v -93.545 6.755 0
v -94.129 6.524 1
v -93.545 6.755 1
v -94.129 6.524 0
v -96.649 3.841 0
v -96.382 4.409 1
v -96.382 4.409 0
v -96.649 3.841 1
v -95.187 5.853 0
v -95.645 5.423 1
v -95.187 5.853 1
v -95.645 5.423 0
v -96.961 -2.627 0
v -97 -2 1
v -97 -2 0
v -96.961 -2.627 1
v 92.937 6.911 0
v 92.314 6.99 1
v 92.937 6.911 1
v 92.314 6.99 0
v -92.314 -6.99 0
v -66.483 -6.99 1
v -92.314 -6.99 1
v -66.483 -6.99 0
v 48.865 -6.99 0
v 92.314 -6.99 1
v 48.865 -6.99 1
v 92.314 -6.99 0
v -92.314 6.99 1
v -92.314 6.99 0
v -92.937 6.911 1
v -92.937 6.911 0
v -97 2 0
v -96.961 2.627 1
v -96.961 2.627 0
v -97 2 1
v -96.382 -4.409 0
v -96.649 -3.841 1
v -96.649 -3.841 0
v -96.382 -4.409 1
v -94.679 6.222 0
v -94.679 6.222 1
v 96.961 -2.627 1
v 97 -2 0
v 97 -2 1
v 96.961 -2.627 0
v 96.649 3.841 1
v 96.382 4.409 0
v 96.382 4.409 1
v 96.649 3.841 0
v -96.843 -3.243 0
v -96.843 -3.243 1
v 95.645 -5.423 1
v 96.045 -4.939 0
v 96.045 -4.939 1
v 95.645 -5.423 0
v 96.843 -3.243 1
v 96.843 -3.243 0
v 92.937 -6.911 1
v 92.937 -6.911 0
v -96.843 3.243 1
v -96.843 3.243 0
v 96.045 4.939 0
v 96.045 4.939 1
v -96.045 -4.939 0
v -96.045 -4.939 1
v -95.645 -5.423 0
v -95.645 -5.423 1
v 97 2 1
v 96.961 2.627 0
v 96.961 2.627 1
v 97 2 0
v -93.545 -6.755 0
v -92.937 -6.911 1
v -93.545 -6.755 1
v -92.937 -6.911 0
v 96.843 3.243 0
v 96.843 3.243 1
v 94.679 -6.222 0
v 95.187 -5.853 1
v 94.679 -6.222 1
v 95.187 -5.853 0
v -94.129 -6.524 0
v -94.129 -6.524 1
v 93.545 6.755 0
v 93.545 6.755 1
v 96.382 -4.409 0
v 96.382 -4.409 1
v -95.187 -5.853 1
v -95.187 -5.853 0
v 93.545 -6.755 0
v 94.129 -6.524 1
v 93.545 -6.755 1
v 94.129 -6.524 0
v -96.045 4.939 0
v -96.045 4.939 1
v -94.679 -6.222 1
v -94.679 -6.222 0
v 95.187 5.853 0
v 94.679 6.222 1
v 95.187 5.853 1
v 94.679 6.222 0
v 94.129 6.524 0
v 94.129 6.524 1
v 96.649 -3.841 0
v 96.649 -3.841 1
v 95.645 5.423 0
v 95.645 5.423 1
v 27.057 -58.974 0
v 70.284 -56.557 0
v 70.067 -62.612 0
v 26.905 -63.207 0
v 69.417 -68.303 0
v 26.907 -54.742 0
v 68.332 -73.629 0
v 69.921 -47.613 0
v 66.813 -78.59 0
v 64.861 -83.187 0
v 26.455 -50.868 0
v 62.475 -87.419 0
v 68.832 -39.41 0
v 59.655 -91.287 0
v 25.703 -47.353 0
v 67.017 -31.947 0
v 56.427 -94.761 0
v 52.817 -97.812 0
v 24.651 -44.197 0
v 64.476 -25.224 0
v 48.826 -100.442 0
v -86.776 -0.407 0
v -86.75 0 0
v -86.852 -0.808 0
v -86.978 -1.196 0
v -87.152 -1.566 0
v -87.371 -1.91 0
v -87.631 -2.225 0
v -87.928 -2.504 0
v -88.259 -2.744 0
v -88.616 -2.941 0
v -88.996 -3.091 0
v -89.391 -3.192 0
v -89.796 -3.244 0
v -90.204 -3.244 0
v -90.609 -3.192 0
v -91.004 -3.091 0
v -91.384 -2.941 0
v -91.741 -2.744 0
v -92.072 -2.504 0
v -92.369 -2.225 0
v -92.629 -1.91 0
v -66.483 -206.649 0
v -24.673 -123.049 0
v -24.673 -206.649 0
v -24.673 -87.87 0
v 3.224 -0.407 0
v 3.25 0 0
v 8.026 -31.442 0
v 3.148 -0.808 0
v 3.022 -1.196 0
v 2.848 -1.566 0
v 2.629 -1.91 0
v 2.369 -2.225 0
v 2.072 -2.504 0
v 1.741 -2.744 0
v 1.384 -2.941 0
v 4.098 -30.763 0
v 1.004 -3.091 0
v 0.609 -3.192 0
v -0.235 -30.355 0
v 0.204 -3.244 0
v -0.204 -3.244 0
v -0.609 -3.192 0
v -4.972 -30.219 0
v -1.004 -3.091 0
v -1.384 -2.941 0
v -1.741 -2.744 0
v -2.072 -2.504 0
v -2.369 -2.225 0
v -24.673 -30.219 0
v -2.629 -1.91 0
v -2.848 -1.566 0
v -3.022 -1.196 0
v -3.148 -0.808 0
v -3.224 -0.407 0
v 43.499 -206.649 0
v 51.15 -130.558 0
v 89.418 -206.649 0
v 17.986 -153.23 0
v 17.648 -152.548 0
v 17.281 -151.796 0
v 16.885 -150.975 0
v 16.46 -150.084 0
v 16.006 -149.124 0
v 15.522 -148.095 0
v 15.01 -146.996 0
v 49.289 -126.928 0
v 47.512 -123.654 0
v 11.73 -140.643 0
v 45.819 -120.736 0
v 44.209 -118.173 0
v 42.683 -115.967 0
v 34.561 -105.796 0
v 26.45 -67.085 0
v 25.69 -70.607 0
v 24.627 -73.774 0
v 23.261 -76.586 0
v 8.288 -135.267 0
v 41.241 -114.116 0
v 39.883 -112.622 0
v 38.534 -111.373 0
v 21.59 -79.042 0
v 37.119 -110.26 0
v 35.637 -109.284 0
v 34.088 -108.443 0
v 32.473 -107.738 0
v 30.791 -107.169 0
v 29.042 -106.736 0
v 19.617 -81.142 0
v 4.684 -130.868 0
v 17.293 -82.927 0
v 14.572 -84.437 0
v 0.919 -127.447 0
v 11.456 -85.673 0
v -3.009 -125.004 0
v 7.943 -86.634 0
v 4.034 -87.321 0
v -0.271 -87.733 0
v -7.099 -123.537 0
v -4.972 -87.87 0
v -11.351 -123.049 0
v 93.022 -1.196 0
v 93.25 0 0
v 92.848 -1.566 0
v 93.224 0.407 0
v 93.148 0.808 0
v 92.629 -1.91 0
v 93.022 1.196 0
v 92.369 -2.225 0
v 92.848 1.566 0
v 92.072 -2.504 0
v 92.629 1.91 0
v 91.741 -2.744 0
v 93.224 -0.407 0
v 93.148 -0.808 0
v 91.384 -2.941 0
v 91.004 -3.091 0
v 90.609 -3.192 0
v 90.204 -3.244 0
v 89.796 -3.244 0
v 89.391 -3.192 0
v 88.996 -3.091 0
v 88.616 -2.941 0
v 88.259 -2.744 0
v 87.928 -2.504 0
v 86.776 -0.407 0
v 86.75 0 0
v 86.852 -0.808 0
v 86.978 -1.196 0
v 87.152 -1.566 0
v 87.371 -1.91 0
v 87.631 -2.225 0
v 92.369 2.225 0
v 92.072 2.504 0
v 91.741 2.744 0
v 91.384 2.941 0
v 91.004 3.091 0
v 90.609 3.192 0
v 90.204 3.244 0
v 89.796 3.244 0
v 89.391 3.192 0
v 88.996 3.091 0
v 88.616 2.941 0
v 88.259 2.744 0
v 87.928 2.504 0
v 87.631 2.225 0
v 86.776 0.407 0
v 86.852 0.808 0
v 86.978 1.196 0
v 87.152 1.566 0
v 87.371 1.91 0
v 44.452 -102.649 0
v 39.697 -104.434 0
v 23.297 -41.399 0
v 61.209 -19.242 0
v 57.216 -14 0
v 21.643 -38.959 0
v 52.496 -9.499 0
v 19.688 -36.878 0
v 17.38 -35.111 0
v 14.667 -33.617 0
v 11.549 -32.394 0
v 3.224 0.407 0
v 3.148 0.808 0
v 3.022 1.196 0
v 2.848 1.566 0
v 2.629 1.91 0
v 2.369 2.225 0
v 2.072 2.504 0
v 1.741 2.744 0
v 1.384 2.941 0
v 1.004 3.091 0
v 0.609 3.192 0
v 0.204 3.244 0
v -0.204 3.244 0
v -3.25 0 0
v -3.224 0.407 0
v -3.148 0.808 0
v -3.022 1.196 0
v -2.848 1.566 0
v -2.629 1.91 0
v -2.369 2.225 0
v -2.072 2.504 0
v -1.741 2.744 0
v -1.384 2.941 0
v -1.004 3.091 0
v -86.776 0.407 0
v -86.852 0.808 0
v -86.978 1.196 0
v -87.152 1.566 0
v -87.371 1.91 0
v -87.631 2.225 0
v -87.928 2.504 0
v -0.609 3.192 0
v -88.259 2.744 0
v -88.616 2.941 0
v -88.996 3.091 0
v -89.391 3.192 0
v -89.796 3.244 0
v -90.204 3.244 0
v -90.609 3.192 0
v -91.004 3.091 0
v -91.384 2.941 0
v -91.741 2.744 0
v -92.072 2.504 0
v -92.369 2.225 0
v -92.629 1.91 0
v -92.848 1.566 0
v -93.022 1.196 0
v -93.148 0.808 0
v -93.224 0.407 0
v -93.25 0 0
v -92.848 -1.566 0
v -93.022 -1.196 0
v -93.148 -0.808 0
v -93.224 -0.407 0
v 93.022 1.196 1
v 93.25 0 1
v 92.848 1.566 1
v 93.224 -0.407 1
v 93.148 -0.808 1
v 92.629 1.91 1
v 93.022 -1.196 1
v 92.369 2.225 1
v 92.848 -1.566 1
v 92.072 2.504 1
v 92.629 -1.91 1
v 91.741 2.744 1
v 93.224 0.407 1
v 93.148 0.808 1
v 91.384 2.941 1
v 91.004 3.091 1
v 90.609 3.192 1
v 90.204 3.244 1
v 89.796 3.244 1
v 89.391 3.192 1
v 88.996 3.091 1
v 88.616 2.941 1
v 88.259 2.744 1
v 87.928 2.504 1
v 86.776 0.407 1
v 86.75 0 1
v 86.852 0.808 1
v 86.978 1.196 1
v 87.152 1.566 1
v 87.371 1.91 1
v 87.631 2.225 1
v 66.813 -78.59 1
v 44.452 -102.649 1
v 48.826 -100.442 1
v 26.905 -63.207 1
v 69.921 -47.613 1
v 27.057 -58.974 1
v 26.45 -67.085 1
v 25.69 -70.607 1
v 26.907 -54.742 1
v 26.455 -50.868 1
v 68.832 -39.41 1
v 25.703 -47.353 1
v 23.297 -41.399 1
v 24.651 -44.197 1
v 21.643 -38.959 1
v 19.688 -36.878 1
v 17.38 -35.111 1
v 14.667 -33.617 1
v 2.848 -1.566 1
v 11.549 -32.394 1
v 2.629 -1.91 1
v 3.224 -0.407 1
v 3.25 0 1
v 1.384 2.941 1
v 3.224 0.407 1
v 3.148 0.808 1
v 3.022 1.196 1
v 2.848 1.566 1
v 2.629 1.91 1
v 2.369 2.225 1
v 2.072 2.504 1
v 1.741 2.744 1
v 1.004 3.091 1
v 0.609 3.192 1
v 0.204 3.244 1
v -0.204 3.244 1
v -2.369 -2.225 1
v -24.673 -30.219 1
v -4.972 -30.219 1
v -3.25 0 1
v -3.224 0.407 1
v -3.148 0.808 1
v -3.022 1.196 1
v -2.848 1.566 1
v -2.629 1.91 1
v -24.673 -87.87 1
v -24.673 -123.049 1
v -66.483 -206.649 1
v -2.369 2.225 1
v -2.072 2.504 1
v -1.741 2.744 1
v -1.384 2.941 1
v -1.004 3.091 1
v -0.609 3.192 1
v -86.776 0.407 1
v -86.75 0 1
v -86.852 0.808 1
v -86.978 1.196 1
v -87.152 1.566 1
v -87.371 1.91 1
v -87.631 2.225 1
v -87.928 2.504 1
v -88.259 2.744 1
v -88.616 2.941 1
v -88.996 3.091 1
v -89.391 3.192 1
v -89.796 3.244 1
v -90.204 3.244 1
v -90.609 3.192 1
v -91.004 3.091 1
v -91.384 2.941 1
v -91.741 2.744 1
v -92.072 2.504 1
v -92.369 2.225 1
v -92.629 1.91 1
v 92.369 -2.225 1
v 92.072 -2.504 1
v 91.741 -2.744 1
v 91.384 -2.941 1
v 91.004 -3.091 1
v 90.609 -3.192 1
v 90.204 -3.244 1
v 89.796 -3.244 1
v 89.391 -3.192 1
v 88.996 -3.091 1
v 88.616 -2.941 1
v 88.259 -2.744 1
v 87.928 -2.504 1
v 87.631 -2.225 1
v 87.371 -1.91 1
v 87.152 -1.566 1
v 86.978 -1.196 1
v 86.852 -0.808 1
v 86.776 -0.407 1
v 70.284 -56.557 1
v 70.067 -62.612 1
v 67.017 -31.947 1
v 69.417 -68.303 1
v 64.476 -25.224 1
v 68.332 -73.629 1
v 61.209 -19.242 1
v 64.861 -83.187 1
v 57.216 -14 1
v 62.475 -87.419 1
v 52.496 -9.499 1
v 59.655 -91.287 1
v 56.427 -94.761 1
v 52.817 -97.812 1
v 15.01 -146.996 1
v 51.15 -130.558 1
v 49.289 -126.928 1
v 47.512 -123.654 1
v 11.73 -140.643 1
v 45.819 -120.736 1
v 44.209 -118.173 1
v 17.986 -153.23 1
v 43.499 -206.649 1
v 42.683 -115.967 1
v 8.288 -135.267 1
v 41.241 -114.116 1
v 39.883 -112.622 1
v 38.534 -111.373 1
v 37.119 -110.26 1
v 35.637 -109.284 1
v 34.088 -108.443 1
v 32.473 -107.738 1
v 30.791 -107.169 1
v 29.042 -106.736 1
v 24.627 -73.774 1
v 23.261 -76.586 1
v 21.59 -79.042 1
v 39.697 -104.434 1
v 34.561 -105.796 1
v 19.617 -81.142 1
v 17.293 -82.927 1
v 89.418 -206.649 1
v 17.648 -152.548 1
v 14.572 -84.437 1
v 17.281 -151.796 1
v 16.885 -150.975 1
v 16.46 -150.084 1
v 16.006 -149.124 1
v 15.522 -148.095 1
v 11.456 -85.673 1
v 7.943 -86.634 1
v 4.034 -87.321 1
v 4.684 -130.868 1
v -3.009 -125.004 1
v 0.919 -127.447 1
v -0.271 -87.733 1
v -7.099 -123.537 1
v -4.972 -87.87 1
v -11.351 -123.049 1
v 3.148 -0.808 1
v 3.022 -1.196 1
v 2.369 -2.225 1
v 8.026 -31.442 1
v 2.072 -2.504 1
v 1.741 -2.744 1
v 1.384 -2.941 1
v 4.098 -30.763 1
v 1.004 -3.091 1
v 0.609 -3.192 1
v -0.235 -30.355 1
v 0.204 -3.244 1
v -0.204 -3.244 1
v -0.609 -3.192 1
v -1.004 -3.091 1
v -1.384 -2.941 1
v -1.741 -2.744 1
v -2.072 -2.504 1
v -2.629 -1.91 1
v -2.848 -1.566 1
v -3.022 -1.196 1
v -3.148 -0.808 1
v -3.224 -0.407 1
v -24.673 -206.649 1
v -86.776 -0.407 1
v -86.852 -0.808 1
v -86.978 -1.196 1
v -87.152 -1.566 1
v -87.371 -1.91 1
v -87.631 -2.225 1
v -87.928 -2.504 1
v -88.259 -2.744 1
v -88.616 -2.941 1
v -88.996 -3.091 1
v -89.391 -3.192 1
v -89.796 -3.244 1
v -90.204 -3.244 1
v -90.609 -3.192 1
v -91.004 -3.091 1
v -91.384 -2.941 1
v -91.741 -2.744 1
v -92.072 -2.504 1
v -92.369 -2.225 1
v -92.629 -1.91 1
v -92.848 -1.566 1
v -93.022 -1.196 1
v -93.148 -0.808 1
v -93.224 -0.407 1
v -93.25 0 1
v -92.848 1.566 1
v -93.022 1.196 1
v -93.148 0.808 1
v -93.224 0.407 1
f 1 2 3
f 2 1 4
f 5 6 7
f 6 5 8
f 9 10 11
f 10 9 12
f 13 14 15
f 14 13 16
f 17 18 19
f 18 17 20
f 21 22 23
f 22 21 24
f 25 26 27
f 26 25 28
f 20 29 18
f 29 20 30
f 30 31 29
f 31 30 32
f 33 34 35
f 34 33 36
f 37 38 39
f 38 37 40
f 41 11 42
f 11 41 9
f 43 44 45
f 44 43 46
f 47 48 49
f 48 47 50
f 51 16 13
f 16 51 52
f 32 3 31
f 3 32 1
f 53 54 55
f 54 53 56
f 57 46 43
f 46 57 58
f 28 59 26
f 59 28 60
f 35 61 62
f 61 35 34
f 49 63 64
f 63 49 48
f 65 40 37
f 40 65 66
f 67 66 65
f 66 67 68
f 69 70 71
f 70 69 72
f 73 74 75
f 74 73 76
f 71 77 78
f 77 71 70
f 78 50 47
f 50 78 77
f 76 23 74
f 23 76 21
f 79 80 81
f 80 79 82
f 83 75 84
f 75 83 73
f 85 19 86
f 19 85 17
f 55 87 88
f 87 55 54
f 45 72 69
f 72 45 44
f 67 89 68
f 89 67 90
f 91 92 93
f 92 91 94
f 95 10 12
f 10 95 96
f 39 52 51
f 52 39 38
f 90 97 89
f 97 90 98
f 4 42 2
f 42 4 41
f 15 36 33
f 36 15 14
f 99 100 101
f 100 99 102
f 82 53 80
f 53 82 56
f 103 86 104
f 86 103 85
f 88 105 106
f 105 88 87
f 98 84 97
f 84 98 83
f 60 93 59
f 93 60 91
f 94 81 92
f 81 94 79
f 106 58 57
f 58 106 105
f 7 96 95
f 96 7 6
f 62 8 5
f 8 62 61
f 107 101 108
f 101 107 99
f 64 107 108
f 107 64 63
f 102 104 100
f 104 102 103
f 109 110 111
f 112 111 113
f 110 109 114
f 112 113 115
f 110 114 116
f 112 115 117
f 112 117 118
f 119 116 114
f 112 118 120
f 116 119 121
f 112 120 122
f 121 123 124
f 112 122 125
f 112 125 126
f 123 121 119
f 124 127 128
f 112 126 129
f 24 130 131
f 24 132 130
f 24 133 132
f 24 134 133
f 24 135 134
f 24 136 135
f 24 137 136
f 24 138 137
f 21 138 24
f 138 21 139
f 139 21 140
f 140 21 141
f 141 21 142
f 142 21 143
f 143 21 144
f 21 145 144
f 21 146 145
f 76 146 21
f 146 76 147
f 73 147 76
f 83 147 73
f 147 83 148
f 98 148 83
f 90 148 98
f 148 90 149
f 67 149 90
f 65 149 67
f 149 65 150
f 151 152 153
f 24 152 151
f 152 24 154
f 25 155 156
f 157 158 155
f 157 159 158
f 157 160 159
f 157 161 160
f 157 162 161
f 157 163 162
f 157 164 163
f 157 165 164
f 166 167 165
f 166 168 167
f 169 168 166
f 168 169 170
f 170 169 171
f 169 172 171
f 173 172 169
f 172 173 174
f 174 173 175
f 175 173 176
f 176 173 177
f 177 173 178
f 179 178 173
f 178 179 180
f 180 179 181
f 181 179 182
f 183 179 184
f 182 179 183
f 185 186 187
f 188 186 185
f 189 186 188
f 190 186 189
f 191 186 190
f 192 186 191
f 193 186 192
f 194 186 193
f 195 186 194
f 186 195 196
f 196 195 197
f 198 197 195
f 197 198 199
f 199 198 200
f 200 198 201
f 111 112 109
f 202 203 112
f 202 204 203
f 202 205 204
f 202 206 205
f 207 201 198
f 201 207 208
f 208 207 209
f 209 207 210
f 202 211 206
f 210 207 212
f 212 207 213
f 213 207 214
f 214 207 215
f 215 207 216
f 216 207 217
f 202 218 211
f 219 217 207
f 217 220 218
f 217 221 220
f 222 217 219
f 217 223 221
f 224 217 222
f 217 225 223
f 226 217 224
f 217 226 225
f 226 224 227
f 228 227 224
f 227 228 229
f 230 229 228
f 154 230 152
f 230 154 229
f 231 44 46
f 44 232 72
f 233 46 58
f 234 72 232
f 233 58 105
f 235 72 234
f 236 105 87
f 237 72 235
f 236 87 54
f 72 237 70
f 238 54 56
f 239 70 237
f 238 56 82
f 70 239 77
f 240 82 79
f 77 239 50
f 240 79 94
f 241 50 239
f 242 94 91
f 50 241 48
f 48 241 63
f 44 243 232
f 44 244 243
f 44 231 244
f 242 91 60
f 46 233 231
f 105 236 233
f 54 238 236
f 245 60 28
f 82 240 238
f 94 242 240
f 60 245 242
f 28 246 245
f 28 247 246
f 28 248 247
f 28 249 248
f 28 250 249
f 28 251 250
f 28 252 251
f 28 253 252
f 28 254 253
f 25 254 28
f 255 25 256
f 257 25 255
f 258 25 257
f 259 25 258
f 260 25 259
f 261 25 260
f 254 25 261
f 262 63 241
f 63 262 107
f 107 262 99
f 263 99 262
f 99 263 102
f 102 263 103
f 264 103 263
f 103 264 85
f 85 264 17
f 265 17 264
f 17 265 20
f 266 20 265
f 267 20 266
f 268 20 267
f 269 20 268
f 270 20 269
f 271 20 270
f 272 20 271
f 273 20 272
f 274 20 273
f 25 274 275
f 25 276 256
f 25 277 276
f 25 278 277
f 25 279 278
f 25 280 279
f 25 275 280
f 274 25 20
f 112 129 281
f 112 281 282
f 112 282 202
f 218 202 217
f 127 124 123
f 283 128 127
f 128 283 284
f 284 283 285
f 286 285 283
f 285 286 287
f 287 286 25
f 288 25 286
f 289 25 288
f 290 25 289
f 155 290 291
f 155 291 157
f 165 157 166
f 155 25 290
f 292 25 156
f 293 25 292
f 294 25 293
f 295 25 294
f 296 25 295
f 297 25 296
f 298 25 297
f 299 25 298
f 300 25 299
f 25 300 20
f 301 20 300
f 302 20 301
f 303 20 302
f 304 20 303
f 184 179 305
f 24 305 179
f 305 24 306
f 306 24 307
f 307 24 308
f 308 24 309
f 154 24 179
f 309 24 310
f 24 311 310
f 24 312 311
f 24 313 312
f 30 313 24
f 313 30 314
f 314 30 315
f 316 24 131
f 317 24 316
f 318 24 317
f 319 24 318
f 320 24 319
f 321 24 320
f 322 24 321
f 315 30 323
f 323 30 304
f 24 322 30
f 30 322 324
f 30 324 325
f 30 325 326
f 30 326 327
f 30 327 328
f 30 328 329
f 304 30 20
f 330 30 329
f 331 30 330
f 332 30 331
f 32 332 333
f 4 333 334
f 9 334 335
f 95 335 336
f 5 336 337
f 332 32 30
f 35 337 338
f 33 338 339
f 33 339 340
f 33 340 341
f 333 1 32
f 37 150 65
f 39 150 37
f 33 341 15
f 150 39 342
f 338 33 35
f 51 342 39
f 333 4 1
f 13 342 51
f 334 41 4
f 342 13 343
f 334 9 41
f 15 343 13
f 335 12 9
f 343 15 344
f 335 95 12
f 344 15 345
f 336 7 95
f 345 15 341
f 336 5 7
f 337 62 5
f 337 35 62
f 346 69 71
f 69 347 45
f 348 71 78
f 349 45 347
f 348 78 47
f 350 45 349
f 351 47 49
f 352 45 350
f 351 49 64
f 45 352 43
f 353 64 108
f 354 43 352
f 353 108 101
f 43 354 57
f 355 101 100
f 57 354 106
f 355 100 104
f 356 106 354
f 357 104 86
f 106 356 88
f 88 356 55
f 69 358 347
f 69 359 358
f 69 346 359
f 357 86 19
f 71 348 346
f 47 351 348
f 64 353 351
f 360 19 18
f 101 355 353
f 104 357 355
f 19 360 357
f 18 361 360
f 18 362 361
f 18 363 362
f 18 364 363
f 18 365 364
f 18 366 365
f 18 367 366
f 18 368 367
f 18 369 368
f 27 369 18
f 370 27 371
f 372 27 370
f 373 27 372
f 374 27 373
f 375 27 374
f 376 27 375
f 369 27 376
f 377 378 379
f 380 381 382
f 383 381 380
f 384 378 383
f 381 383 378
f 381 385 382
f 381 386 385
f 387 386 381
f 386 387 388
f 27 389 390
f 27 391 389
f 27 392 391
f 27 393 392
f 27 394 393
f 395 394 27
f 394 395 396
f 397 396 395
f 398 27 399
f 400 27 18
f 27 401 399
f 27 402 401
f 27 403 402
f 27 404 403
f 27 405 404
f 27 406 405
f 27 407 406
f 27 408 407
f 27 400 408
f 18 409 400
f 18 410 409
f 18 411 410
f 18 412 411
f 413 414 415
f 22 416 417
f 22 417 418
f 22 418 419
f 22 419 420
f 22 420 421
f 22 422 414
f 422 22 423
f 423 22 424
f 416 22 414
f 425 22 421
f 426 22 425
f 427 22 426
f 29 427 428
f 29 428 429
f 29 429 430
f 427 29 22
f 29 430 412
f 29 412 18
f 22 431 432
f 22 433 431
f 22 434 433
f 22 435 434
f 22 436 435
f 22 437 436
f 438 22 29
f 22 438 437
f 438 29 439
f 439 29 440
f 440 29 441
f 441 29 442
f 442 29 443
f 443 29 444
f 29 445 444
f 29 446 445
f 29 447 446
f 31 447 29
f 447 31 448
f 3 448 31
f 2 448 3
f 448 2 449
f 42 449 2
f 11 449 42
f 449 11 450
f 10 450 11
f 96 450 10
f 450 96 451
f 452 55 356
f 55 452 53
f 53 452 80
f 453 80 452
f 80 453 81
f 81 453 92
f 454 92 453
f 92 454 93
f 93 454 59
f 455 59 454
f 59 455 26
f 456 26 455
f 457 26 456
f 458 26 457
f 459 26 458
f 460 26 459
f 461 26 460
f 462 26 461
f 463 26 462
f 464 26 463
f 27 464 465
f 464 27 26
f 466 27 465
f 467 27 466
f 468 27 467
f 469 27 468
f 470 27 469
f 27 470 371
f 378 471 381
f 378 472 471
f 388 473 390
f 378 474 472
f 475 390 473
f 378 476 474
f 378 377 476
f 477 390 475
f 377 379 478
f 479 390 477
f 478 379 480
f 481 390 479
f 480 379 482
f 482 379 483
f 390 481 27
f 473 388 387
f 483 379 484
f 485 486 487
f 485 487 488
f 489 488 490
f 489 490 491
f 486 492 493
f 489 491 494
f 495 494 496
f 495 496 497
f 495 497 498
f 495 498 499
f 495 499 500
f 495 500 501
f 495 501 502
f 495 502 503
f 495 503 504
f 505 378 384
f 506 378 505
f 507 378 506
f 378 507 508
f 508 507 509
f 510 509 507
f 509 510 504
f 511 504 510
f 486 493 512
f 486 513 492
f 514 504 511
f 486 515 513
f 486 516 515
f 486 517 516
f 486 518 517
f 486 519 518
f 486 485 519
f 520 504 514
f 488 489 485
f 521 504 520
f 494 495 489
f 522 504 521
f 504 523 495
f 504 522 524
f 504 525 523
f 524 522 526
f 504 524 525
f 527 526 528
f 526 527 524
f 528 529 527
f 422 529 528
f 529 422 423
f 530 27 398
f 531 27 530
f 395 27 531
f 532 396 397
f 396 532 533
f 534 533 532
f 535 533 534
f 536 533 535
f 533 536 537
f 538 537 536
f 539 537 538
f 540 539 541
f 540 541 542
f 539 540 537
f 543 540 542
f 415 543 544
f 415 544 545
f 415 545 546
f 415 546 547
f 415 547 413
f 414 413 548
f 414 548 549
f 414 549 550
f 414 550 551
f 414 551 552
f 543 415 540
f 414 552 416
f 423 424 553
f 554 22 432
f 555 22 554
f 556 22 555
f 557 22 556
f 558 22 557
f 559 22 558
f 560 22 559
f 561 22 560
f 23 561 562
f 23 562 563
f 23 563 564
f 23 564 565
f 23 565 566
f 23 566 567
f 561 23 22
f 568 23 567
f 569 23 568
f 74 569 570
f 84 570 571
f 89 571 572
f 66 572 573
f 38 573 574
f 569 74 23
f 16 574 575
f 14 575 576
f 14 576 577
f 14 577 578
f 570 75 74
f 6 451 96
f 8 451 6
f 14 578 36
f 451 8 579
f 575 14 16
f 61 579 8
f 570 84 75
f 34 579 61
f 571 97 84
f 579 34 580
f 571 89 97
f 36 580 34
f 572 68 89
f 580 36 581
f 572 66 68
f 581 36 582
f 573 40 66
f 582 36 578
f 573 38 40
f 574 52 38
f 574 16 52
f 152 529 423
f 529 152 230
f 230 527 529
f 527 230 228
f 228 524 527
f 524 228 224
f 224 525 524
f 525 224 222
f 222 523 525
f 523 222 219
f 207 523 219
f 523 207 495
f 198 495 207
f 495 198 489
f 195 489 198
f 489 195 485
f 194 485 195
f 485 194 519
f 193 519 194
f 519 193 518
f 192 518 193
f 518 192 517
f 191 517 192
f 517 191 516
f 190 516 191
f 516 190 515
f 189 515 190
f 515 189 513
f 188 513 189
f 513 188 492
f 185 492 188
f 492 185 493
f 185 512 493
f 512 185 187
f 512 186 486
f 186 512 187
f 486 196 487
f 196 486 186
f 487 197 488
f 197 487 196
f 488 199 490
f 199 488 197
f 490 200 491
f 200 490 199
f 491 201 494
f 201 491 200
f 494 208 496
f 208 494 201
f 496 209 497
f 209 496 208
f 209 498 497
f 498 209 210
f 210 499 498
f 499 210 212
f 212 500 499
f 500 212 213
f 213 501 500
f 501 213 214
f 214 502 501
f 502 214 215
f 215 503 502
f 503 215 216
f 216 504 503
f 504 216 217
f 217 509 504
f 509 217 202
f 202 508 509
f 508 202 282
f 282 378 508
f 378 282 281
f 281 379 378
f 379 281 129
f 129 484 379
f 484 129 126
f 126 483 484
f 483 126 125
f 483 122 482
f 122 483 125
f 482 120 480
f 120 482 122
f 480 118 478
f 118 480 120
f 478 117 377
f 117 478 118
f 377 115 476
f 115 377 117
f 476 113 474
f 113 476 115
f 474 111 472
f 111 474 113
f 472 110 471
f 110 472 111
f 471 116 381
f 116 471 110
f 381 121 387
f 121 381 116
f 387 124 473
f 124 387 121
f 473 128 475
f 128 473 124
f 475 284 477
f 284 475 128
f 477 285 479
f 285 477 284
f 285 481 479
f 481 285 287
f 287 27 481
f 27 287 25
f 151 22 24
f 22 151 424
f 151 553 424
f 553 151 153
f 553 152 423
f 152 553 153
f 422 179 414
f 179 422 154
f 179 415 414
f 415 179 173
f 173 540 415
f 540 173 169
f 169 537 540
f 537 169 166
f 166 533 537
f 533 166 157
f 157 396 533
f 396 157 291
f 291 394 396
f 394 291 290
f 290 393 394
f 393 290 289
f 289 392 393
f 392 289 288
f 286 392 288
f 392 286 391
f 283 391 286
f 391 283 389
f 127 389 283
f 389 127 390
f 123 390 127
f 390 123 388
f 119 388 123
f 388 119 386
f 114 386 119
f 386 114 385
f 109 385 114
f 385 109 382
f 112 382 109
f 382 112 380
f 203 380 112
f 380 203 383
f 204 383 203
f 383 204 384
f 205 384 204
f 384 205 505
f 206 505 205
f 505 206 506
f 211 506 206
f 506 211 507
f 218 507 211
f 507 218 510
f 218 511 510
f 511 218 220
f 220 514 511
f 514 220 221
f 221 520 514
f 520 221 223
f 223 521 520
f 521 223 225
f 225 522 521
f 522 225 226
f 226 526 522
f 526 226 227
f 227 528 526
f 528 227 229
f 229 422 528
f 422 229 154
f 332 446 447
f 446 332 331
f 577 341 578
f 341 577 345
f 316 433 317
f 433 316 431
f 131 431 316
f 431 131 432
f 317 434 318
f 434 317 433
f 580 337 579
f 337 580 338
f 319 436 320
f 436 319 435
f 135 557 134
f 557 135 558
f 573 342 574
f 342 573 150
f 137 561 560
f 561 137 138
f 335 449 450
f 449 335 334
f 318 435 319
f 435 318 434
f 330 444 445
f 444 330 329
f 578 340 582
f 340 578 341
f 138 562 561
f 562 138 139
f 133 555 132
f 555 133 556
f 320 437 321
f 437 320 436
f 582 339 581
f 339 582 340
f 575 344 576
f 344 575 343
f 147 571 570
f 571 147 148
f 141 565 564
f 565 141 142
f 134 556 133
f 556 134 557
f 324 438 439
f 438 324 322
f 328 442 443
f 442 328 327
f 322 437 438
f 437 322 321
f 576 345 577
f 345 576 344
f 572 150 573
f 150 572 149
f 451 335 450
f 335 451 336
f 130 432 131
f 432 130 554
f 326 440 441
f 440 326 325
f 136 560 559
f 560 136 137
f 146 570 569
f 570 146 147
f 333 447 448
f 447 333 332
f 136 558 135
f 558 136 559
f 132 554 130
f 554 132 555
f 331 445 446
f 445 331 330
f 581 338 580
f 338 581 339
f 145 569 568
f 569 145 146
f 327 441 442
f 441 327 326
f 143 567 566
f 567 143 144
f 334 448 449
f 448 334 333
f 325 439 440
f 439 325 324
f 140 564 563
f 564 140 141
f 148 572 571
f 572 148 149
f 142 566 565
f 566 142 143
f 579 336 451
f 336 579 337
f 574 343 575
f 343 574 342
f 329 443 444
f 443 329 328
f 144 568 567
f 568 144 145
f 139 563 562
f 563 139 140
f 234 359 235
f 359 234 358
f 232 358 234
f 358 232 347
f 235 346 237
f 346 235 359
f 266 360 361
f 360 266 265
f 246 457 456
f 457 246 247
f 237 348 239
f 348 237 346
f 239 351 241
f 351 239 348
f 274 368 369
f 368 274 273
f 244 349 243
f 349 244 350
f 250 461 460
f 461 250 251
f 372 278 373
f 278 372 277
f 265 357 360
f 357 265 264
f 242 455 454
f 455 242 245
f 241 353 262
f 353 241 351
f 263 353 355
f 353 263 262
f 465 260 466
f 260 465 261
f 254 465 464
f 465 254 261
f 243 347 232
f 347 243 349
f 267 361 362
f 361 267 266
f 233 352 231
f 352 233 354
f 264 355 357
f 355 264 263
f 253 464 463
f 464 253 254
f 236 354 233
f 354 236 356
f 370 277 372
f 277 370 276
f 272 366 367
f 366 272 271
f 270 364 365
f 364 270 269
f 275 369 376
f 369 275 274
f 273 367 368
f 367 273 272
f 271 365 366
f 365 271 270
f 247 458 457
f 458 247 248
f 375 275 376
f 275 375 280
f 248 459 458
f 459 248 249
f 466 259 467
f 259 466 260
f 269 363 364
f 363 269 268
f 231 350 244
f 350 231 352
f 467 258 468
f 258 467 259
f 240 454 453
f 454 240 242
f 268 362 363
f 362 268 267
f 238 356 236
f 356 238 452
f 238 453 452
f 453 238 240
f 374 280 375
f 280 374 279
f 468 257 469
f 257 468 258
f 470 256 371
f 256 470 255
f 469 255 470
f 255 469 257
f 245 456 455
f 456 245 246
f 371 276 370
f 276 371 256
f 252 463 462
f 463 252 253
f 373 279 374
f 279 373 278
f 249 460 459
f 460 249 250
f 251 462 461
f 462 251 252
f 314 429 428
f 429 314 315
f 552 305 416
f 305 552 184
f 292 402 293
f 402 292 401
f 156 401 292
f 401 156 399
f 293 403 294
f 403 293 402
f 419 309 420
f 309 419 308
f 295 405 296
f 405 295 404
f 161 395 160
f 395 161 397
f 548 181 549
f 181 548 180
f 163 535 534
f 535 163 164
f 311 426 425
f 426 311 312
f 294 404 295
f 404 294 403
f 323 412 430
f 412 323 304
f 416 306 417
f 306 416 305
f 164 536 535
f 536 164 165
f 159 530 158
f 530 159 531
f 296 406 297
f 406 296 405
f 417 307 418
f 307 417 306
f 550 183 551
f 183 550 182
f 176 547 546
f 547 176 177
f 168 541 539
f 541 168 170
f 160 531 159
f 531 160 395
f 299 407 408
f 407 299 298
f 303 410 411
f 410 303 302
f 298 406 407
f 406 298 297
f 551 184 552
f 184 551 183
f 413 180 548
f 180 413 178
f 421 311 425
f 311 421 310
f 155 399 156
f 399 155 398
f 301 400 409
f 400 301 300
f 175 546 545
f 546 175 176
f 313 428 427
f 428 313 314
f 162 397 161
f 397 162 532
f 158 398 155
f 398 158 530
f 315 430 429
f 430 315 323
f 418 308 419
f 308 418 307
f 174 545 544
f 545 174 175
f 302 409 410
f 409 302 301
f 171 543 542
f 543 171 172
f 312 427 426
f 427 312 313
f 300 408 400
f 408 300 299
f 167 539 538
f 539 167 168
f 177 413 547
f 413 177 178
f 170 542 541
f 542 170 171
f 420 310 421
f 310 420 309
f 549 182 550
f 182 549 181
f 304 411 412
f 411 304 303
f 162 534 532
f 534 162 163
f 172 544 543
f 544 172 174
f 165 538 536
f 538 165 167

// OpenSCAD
$fn = 50;


difference() {
	union() {
		translate(v = [0, 0, 0]) {
			rotate(a = [0, 0, 0]) {
				hull() {
					translate(v = [-92.0000000000, 2.0000000000, 0]) {
						rotate(a = [0, 0, 0]) {
							translate(v = [0, 0, 0]) {
								rotate(a = [0, 0, 0]) {
									cylinder(h = 1, r = 5);
								}
							}
						}
					}
					translate(v = [92.0000000000, 2.0000000000, 0]) {
						rotate(a = [0, 0, 0]) {
							translate(v = [0, 0, 0]) {
								rotate(a = [0, 0, 0]) {
									cylinder(h = 1, r = 5);
								}
							}
						}
					}
					translate(v = [-92.0000000000, -2.0000000000, 0]) {
						rotate(a = [0, 0, 0]) {
							translate(v = [0, 0, 0]) {
								rotate(a = [0, 0, 0]) {
									cylinder(h = 1, r = 5);
								}
							}
						}
					}
					translate(v = [92.0000000000, -2.0000000000, 0]) {
						rotate(a = [0, 0, 0]) {
							translate(v = [0, 0, 0]) {
								rotate(a = [0, 0, 0]) {
									cylinder(h = 1, r = 5);
								}
							}
						}
					}
				}
			}
		}
		translate(v = [0, 0, 0]) {
			rotate(a = [0, 0, 0]) {
				linear_extrude(height = 1) {
					text(font = "DejaVu Sans Mono:style=Bold", halign = "center", size = 209.0000000000, text = "R", valign = "top");
				}
			}
		}
	}
	union() {
		translate(v = [-90.0000000000, 0.0000000000, -125.0000000000]) {
			rotate(a = [0, 0, 0]) {
				cylinder(h = 250, r = 3.2500000000);
			}
		}
		translate(v = [90.0000000000, 0.0000000000, -125.0000000000]) {
			rotate(a = [0, 0, 0]) {
				cylinder(h = 250, r = 3.2500000000);
			}
		}
		translate(v = [90.0000000000, 0.0000000000, -125.0000000000]) {
			rotate(a = [0, 0, 0]) {
				cylinder(h = 250, r = 3.2500000000);
			}
		}
		translate(v = [0, 0, -125.0000000000]) {
			rotate(a = [0, 0, 0]) {
				cylinder(h = 250, r = 3.2500000000);
			}
		}
	}
}
